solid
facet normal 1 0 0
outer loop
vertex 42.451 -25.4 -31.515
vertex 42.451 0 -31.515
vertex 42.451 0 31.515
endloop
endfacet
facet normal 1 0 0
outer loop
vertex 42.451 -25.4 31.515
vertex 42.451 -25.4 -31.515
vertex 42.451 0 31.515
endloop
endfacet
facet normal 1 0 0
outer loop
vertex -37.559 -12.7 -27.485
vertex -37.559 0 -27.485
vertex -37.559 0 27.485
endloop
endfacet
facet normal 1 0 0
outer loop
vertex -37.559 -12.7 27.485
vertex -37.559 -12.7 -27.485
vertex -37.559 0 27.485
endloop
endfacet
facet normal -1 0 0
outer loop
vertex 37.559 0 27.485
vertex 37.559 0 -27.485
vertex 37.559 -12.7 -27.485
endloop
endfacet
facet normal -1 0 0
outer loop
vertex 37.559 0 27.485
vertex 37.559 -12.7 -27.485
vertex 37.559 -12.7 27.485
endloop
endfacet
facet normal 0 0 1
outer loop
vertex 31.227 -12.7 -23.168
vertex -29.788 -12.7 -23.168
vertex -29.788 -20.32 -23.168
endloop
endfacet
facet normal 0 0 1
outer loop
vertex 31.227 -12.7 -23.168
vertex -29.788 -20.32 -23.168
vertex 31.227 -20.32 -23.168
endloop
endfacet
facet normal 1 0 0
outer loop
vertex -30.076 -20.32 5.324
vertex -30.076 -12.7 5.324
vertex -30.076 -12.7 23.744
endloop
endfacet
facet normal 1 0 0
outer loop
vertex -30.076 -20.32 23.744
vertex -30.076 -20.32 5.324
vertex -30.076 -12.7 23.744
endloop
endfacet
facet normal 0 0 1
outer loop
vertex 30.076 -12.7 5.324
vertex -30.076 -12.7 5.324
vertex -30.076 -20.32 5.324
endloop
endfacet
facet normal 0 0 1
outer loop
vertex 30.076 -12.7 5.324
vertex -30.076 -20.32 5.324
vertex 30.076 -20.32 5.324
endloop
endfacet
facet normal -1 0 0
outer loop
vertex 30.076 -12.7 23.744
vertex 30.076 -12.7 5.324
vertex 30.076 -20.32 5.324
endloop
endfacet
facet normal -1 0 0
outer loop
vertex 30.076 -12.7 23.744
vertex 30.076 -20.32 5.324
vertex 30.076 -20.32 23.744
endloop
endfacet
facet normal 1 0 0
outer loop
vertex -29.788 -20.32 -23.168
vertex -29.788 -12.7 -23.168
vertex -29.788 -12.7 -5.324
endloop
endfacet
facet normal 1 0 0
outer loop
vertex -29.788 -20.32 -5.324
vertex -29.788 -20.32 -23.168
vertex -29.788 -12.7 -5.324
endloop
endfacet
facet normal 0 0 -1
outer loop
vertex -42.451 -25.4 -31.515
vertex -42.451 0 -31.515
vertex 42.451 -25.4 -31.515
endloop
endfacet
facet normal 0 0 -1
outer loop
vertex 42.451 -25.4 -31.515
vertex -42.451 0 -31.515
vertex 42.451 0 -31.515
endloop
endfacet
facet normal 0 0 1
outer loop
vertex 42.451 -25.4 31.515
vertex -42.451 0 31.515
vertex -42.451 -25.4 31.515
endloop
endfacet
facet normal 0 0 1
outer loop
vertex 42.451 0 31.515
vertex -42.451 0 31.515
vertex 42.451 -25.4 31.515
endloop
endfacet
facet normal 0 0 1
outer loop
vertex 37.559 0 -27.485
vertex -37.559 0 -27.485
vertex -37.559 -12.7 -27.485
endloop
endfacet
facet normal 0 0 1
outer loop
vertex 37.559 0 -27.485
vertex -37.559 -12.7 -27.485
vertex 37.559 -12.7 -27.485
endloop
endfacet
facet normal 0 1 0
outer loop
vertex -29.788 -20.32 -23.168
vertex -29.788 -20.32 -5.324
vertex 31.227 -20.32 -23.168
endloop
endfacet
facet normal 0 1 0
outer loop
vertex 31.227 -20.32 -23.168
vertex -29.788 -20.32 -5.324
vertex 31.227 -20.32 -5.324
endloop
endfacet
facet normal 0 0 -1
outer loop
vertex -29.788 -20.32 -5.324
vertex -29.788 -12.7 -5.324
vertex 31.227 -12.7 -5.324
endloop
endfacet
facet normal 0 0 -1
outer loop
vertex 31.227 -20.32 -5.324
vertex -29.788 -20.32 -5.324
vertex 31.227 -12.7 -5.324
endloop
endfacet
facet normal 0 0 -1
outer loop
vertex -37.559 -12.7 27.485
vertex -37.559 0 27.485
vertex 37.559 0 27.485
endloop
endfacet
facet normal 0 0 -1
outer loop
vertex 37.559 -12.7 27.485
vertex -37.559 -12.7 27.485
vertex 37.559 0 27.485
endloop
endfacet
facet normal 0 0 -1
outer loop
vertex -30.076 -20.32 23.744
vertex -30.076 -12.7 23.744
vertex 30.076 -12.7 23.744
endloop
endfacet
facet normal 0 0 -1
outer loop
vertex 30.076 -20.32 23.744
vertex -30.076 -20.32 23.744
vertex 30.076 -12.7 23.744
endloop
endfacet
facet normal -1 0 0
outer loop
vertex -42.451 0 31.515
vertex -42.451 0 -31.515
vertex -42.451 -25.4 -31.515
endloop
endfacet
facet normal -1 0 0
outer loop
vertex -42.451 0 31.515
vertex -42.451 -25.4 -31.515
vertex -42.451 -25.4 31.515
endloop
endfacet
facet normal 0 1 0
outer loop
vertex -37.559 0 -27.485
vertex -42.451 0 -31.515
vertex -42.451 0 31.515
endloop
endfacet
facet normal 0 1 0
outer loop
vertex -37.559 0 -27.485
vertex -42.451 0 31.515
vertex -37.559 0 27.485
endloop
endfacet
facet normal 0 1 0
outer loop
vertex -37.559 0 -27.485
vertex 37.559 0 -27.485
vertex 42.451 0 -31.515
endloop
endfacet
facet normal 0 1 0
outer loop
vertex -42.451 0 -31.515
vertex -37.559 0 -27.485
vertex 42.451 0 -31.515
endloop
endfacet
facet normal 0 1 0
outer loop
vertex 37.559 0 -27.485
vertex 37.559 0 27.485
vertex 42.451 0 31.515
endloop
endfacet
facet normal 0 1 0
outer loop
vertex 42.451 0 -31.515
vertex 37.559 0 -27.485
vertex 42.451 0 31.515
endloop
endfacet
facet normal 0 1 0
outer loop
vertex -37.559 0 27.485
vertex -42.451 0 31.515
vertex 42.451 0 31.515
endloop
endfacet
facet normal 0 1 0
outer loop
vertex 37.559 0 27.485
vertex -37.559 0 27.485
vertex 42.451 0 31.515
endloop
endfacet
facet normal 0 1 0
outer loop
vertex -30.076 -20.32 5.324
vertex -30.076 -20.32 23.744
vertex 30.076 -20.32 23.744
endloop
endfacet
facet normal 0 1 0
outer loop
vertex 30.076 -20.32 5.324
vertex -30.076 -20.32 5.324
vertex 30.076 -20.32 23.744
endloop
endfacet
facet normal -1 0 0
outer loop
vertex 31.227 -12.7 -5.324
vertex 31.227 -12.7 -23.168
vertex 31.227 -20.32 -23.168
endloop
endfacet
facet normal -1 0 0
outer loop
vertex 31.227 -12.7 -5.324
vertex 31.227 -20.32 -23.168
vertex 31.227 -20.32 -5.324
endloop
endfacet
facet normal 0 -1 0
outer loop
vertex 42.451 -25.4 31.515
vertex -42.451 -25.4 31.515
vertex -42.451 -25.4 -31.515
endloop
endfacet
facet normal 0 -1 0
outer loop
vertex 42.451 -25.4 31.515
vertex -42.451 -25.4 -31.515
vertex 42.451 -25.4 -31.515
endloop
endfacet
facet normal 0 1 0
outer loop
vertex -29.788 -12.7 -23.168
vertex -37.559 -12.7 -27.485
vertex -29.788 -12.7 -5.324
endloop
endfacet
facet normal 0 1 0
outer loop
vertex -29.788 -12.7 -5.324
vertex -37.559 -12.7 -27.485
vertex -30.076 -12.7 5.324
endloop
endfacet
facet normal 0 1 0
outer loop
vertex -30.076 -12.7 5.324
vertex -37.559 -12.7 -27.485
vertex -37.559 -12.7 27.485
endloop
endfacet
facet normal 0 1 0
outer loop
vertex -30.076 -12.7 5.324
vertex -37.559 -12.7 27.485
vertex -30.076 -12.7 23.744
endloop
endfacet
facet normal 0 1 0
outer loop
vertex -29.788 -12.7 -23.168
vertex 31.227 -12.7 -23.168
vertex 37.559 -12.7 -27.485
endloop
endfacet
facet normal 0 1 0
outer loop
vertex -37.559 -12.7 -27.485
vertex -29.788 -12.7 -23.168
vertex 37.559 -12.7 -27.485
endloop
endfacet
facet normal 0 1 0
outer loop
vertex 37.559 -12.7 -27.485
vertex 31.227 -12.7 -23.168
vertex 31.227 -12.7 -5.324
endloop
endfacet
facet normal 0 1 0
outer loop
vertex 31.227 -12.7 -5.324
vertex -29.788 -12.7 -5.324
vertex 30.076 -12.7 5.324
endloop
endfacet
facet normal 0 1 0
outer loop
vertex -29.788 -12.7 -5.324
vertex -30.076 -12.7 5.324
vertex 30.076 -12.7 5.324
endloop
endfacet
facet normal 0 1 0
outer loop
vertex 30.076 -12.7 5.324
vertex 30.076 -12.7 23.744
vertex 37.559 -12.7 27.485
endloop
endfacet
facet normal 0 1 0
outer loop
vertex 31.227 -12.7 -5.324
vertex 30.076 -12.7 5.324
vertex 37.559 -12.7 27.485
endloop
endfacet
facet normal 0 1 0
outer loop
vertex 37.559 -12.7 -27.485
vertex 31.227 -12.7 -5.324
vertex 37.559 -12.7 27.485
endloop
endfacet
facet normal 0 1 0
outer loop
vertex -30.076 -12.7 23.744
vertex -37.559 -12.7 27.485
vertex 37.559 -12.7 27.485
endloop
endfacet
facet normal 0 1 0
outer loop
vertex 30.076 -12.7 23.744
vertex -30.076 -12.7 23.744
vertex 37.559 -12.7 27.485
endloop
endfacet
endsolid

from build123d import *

# Parameters (mm, degrees)
F0_W     = 84.902704
F0_H     = 63.02946
F0_W_2   = 75.117304
F0_H_2   = 54.970898
F0_W_3   = 61.014818
F0_H_3   = 17.843956
F0_W_4   = 60.1514
F0_H_4   = 18.419567
F1_DEPTH = 25.4
F2_DEPTH = 12.7
F3_DEPTH = 20.32


with BuildPart() as f1:
    # F0 (on Front) → F1 (new body)
    with BuildSketch(Plane.XZ):
        Rectangle(F0_W, F0_H)
        Rectangle(F0_W_2, F0_H_2, mode=Mode.SUBTRACT)
        Rectangle(F0_W_2, F0_H_2)
        with Locations((0.719513, -14.246385)):
            Rectangle(F0_W_3, F0_H_3, mode=Mode.SUBTRACT)
        with Locations((-1e-06, 14.53419)):
            Rectangle(F0_W_4, F0_H_4, mode=Mode.SUBTRACT)
        with Locations((-1e-06, 14.53419)):
            Rectangle(F0_W_4, F0_H_4)
        with Locations((0.719513, -14.246385)):
            Rectangle(F0_W_3, F0_H_3)
    extrude(amount=F1_DEPTH)

    # F0 (on Front) → F2 (cut)
    with BuildSketch(Plane.XZ):
        Rectangle(F0_W_2, F0_H_2)
        with Locations((0.719513, -14.246385)):
            Rectangle(F0_W_3, F0_H_3, mode=Mode.SUBTRACT)
        with Locations((-1e-06, 14.53419)):
            Rectangle(F0_W_4, F0_H_4, mode=Mode.SUBTRACT)
        with Locations((-1e-06, 14.53419)):
            Rectangle(F0_W_4, F0_H_4)
        with Locations((0.719513, -14.246385)):
            Rectangle(F0_W_3, F0_H_3)
    extrude(amount=F2_DEPTH, mode=Mode.SUBTRACT)

    # F0 (on Front) → F3 (cut)
    with BuildSketch(Plane.XZ):
        with Locations((-1e-06, 14.53419)):
            Rectangle(F0_W_4, F0_H_4)
        with Locations((0.719513, -14.246385)):
            Rectangle(F0_W_3, F0_H_3)
    extrude(amount=F3_DEPTH, mode=Mode.SUBTRACT)


solid = f1.part
